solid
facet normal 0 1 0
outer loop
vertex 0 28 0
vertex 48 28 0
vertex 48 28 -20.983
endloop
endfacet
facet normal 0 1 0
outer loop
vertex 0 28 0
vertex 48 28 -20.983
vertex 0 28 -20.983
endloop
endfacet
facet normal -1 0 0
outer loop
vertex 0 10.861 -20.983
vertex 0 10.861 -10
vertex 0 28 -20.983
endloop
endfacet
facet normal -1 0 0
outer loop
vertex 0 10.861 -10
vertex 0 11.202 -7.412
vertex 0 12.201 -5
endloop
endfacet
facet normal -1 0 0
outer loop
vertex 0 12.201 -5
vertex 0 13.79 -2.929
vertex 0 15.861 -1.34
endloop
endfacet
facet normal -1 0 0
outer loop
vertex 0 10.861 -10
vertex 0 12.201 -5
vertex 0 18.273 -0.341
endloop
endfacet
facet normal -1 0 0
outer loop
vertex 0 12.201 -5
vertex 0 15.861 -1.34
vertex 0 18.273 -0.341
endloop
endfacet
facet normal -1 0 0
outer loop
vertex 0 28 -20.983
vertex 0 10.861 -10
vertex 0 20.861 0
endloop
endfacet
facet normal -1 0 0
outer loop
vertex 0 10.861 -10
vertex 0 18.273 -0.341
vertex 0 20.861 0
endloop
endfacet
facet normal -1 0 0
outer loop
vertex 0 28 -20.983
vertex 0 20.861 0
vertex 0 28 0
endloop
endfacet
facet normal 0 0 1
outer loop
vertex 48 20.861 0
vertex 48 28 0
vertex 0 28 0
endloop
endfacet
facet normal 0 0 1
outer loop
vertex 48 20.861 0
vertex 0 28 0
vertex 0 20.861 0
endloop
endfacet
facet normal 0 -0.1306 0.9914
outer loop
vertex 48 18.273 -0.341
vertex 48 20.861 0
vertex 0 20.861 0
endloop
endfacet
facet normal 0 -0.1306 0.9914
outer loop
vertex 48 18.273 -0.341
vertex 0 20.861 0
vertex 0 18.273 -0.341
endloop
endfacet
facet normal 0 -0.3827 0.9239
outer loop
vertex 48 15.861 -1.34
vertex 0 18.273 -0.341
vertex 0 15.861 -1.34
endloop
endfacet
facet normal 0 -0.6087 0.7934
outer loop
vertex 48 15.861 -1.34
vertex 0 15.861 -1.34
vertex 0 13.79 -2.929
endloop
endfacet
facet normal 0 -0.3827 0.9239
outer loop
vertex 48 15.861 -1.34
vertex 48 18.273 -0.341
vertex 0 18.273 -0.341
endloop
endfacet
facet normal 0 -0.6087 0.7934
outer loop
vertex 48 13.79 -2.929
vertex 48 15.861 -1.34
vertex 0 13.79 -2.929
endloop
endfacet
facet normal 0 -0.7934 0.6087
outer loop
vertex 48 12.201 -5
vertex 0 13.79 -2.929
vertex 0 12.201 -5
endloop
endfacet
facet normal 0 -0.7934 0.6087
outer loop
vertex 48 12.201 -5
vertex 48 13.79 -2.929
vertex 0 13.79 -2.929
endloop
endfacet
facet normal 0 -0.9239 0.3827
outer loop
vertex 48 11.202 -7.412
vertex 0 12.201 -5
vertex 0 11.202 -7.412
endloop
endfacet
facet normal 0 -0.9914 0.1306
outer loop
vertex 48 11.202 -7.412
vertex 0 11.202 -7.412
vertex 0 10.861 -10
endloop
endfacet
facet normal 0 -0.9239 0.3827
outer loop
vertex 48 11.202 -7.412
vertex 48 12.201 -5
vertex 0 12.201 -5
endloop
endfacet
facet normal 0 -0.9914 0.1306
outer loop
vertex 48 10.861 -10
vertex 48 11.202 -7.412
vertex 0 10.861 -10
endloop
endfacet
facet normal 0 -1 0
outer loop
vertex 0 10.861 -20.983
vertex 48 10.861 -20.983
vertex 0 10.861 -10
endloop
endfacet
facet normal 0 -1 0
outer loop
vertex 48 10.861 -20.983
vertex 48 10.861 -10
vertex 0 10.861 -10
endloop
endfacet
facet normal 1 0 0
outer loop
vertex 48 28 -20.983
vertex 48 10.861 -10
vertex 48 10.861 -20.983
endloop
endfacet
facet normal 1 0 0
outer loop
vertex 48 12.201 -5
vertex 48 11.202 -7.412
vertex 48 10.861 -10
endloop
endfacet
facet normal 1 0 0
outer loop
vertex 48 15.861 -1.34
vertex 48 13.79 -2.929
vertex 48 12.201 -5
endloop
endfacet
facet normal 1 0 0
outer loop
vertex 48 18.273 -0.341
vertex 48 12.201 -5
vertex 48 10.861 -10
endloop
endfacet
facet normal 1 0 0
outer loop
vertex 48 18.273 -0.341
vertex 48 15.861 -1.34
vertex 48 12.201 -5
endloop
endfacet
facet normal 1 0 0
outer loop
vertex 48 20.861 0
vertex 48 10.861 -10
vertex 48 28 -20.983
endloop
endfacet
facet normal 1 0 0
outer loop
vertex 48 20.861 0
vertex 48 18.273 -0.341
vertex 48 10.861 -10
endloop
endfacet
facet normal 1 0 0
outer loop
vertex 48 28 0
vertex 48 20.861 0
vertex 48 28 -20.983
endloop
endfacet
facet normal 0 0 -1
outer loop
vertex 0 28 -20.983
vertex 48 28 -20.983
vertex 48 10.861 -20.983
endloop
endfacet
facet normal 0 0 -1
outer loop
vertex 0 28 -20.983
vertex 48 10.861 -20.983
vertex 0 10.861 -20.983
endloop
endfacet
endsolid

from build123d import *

# Parameters (mm, degrees)
SKETCH1_W            = 48
SKETCH1_H            = 53
BOSS_EXTRUDE1_DEPTH  = 10
SKETCH2_W            = 48
SKETCH2_H            = 5.616325
BOSS_EXTRUDE2_DEPTH  = 33.1917878
SKETCH4_W            = 4
SKETCH4_H            = 10
BOSS_EXTRUDE4_DEPTH  = 40
SKETCH5_W            = 48
SKETCH5_H            = 10.8609375
BOSS_EXTRUDE5_DEPTH  = 23.1917878
SKETCH6_W            = 48
SKETCH6_H            = 5
BOSS_EXTRUDE6_DEPTH  = 42.3
SKETCH7_W            = 12.8082122
SKETCH7_H            = 16.4772625
BOSS_EXTRUDE7_DEPTH  = 48
CUT_EXTRUDE1_REACH   = 84.426
SKETCH8_R            = 11.5
SKETCH8_R_2          = 2
FILLET1_R            = 10
FILLET2_R            = 4
SKETCH9_W            = 5
SKETCH9_H            = 16.4772625
BOSS_EXTRUDE9_DEPTH  = 48
CUT_EXTRUDE2_DEPTH   = 6
SKETCH11_R           = 1.9304
CUT_EXTRUDE3_DEPTH   = 6
BOSS_EXTRUDE11_DEPTH = 3
BOSS_EXTRUDE12_DEPTH = 48
SKETCH14_W           = 119.824941969
SKETCH14_H           = 122.237524693
CUT_EXTRUDE4_DEPTH   = 90.10667764
SKETCH15_W           = 48
SKETCH15_H           = 17.1390625
BOSS_EXTRUDE13_DEPTH = 3.175


with BuildPart() as part:
    # Sketch1 → Boss-Extrude1 (new body)
    with BuildSketch(Plane.XY):
        with Locations((24, 26.5)):
            Rectangle(SKETCH1_W, SKETCH1_H)
    extrude(amount=BOSS_EXTRUDE1_DEPTH)

    # Sketch2 → Boss-Extrude2 (add)
    with BuildSketch(Plane(origin=(0, 0, 0), x_dir=(-1, 0, 0), z_dir=(0, 0, -1))):
        with Locations((-24, -2.8081625)):
            Rectangle(SKETCH2_W, SKETCH2_H)
    extrude(amount=-BOSS_EXTRUDE2_DEPTH)

    # Sketch4 → Boss-Extrude4 (add)
    with BuildSketch(Plane.XY.offset(10)):
        with Locations((2, 48)):
            Rectangle(SKETCH4_W, SKETCH4_H)
        with Locations((46, 48)):
            Rectangle(SKETCH4_W, SKETCH4_H)
    extrude(amount=BOSS_EXTRUDE4_DEPTH)

    # Sketch5 → Boss-Extrude5 (add)
    with BuildSketch(Plane.XY.offset(10)):
        with Locations((24, 5.43046875)):
            Rectangle(SKETCH5_W, SKETCH5_H)
    extrude(amount=BOSS_EXTRUDE5_DEPTH)

    # Sketch6 → Boss-Extrude6 (add)
    with BuildSketch(Plane.XZ.offset(5.616325)):
        with Locations((24, 30.6917878)):
            Rectangle(SKETCH6_W, SKETCH6_H)
    extrude(amount=BOSS_EXTRUDE6_DEPTH)

    # Sketch7 → Boss-Extrude7 (add)
    with BuildSketch(Plane.ZY):
        with Locations((-6.4041061, 2.62230625)):
            Rectangle(SKETCH7_W, SKETCH7_H)
    extrude(amount=-BOSS_EXTRUDE7_DEPTH)

    # Sketch8 → Cut-Extrude1 (cut, up to next)
    with BuildSketch(Plane(origin=(0, 0, 28.1917878), x_dir=(-1, 0, 0), z_dir=(0, 0, -1)), mode=Mode.PRIVATE) as cut_extrude1_sk1:
        with Locations((-24, -26.616325)):
            Circle(SKETCH8_R)
    cut_extrude1_tool1 = extrude(cut_extrude1_sk1.sketch, amount=-CUT_EXTRUDE1_REACH, mode=Mode.PRIVATE) & part.part
    # Sketch8 → Cut-Extrude1 (cut, up to next)
    with BuildSketch(Plane(origin=(0, 0, 28.1917878), x_dir=(-1, 0, 0), z_dir=(0, 0, -1)), mode=Mode.PRIVATE) as cut_extrude1_sk2:
        with Locations((-39.5, -11.116325)):
            Circle(SKETCH8_R_2)
    cut_extrude1_tool2 = extrude(cut_extrude1_sk2.sketch, amount=-CUT_EXTRUDE1_REACH, mode=Mode.PRIVATE) & part.part
    # Sketch8 → Cut-Extrude1 (cut, up to next)
    with BuildSketch(Plane(origin=(0, 0, 28.1917878), x_dir=(-1, 0, 0), z_dir=(0, 0, -1)), mode=Mode.PRIVATE) as cut_extrude1_sk3:
        with Locations((-39.5, -42.116325)):
            Circle(SKETCH8_R_2)
    cut_extrude1_tool3 = extrude(cut_extrude1_sk3.sketch, amount=-CUT_EXTRUDE1_REACH, mode=Mode.PRIVATE) & part.part
    # Sketch8 → Cut-Extrude1 (cut, up to next)
    with BuildSketch(Plane(origin=(0, 0, 28.1917878), x_dir=(-1, 0, 0), z_dir=(0, 0, -1)), mode=Mode.PRIVATE) as cut_extrude1_sk4:
        with Locations((-8.5, -11.116325)):
            Circle(SKETCH8_R_2)
    cut_extrude1_tool4 = extrude(cut_extrude1_sk4.sketch, amount=-CUT_EXTRUDE1_REACH, mode=Mode.PRIVATE) & part.part
    # Sketch8 → Cut-Extrude1 (cut, up to next)
    with BuildSketch(Plane(origin=(0, 0, 28.1917878), x_dir=(-1, 0, 0), z_dir=(0, 0, -1)), mode=Mode.PRIVATE) as cut_extrude1_sk5:
        with Locations((-8.5, -42.116325)):
            Circle(SKETCH8_R_2)
    cut_extrude1_tool5 = extrude(cut_extrude1_sk5.sketch, amount=-CUT_EXTRUDE1_REACH, mode=Mode.PRIVATE) & part.part
    add(cut_extrude1_tool1.solids().sort_by_distance((24, -26.616325, 28.191788))[0], mode=Mode.SUBTRACT)
    add(cut_extrude1_tool2.solids().sort_by_distance((39.5, -11.116325, 28.191788))[0], mode=Mode.SUBTRACT)
    add(cut_extrude1_tool3.solids().sort_by_distance((39.5, -42.116325, 28.191788))[0], mode=Mode.SUBTRACT)
    add(cut_extrude1_tool4.solids().sort_by_distance((8.5, -11.116325, 28.191788))[0], mode=Mode.SUBTRACT)
    add(cut_extrude1_tool5.solids().sort_by_distance((8.5, -42.116325, 28.191788))[0], mode=Mode.SUBTRACT)

    # Fillet1
    fillet1_edges = [part.edges().sort_by_distance(p)[0] for p in [
        (24, 10.8609375, 0),
    ]]
    fillet(fillet1_edges, radius=FILLET1_R)

    # Fillet2
    fillet2_edges = [part.edges().sort_by_distance(p)[0] for p in [
        (2, 43, 10),
        (46, 43, 10),
    ]]
    fillet(fillet2_edges, radius=FILLET2_R)

    # Sketch9 → Boss-Extrude9 (add)
    with BuildSketch(Plane(origin=(48, 0, 0), x_dir=(0, 0, -1), z_dir=(1, 0, 0))):
        with Locations((15.3082122, 2.62230625)):
            Rectangle(SKETCH9_W, SKETCH9_H)
    extrude(amount=-BOSS_EXTRUDE9_DEPTH)

    # Sketch10 → Cut-Extrude2 (cut)
    with BuildSketch(Plane.XY.offset(10)):
        Polygon((12.429, 36.979734073), (9, 38.959468146), (5.571, 36.979734073), (5.571, 33.020265927), (9, 31.040531854), (12.429, 33.020265927), align=None)
        Polygon((35.571, 36.979734073), (35.571, 33.020265927), (39, 31.040531854), (42.429, 33.020265927), (42.429, 36.979734073), (39, 38.959468146), align=None)
    extrude(amount=-CUT_EXTRUDE2_DEPTH, mode=Mode.SUBTRACT)

    # Sketch11 → Cut-Extrude3 (cut)
    with BuildSketch(Plane.XY.offset(4)):
        with Locations((9, 35)):
            Circle(SKETCH11_R)
        with Locations((39, 35)):
            Circle(SKETCH11_R)
    extrude(amount=-CUT_EXTRUDE3_DEPTH, mode=Mode.SUBTRACT)

    # Sketch12 → Boss-Extrude11 (add)
    with BuildSketch(Plane(origin=(0, 53, 0), x_dir=(1, 0, 0), z_dir=(0, 1, 0))):
        Polygon((0, 0), (0, -50), (4, -50), (4, -10), (44, -10), (44, -50), (48, -50), (48, 0), align=None)
    extrude(amount=BOSS_EXTRUDE11_DEPTH)

    # Sketch13 → Boss-Extrude12 (add)
    with BuildSketch(Plane(origin=(48, 0, 0), x_dir=(0, 0, -1), z_dir=(1, 0, 0))):
        with BuildLine():
            Line((17.8082122, 10.8609375), (10, 10.8609375))
            ThreePointArc((10, 10.8609375), (2.928932188, 13.789869688), (0, 20.8609375))
            Line((0, 20.8609375), (0, 28))
            Line((0, 28), (17.8082122, 28))
            Line((17.8082122, 28), (17.8082122, 10.8609375))
        make_face()
    extrude(amount=-BOSS_EXTRUDE12_DEPTH)

    # Sketch14 → Cut-Extrude4 (cut, through all)
    with BuildSketch(Plane(origin=(48, 0, 0), x_dir=(0, 0, -1), z_dir=(1, 0, 0))):
        with Locations((-16.90365686, 8.216937598)):
            Rectangle(SKETCH14_W, SKETCH14_H)
        with BuildLine():
            Line((0, 28), (0, 20.8609375))
            ThreePointArc((0, 20.8609375), (2.928932188, 13.789869688), (10, 10.8609375))
            Line((10, 10.8609375), (17.8082122, 10.8609375))
            Line((17.8082122, 10.8609375), (17.8082122, 28))
            Line((17.8082122, 28), (0, 28))
        make_face(mode=Mode.SUBTRACT)
    extrude(amount=-CUT_EXTRUDE4_DEPTH, mode=Mode.SUBTRACT)

    # Sketch15 → Boss-Extrude13 (add)
    with BuildSketch(Plane(origin=(0, 0, -17.8082122), x_dir=(-1, 0, 0), z_dir=(0, 0, -1))):
        with Locations((-24, 19.43046875)):
            Rectangle(SKETCH15_W, SKETCH15_H)
    extrude(amount=BOSS_EXTRUDE13_DEPTH)


solid = part.part
